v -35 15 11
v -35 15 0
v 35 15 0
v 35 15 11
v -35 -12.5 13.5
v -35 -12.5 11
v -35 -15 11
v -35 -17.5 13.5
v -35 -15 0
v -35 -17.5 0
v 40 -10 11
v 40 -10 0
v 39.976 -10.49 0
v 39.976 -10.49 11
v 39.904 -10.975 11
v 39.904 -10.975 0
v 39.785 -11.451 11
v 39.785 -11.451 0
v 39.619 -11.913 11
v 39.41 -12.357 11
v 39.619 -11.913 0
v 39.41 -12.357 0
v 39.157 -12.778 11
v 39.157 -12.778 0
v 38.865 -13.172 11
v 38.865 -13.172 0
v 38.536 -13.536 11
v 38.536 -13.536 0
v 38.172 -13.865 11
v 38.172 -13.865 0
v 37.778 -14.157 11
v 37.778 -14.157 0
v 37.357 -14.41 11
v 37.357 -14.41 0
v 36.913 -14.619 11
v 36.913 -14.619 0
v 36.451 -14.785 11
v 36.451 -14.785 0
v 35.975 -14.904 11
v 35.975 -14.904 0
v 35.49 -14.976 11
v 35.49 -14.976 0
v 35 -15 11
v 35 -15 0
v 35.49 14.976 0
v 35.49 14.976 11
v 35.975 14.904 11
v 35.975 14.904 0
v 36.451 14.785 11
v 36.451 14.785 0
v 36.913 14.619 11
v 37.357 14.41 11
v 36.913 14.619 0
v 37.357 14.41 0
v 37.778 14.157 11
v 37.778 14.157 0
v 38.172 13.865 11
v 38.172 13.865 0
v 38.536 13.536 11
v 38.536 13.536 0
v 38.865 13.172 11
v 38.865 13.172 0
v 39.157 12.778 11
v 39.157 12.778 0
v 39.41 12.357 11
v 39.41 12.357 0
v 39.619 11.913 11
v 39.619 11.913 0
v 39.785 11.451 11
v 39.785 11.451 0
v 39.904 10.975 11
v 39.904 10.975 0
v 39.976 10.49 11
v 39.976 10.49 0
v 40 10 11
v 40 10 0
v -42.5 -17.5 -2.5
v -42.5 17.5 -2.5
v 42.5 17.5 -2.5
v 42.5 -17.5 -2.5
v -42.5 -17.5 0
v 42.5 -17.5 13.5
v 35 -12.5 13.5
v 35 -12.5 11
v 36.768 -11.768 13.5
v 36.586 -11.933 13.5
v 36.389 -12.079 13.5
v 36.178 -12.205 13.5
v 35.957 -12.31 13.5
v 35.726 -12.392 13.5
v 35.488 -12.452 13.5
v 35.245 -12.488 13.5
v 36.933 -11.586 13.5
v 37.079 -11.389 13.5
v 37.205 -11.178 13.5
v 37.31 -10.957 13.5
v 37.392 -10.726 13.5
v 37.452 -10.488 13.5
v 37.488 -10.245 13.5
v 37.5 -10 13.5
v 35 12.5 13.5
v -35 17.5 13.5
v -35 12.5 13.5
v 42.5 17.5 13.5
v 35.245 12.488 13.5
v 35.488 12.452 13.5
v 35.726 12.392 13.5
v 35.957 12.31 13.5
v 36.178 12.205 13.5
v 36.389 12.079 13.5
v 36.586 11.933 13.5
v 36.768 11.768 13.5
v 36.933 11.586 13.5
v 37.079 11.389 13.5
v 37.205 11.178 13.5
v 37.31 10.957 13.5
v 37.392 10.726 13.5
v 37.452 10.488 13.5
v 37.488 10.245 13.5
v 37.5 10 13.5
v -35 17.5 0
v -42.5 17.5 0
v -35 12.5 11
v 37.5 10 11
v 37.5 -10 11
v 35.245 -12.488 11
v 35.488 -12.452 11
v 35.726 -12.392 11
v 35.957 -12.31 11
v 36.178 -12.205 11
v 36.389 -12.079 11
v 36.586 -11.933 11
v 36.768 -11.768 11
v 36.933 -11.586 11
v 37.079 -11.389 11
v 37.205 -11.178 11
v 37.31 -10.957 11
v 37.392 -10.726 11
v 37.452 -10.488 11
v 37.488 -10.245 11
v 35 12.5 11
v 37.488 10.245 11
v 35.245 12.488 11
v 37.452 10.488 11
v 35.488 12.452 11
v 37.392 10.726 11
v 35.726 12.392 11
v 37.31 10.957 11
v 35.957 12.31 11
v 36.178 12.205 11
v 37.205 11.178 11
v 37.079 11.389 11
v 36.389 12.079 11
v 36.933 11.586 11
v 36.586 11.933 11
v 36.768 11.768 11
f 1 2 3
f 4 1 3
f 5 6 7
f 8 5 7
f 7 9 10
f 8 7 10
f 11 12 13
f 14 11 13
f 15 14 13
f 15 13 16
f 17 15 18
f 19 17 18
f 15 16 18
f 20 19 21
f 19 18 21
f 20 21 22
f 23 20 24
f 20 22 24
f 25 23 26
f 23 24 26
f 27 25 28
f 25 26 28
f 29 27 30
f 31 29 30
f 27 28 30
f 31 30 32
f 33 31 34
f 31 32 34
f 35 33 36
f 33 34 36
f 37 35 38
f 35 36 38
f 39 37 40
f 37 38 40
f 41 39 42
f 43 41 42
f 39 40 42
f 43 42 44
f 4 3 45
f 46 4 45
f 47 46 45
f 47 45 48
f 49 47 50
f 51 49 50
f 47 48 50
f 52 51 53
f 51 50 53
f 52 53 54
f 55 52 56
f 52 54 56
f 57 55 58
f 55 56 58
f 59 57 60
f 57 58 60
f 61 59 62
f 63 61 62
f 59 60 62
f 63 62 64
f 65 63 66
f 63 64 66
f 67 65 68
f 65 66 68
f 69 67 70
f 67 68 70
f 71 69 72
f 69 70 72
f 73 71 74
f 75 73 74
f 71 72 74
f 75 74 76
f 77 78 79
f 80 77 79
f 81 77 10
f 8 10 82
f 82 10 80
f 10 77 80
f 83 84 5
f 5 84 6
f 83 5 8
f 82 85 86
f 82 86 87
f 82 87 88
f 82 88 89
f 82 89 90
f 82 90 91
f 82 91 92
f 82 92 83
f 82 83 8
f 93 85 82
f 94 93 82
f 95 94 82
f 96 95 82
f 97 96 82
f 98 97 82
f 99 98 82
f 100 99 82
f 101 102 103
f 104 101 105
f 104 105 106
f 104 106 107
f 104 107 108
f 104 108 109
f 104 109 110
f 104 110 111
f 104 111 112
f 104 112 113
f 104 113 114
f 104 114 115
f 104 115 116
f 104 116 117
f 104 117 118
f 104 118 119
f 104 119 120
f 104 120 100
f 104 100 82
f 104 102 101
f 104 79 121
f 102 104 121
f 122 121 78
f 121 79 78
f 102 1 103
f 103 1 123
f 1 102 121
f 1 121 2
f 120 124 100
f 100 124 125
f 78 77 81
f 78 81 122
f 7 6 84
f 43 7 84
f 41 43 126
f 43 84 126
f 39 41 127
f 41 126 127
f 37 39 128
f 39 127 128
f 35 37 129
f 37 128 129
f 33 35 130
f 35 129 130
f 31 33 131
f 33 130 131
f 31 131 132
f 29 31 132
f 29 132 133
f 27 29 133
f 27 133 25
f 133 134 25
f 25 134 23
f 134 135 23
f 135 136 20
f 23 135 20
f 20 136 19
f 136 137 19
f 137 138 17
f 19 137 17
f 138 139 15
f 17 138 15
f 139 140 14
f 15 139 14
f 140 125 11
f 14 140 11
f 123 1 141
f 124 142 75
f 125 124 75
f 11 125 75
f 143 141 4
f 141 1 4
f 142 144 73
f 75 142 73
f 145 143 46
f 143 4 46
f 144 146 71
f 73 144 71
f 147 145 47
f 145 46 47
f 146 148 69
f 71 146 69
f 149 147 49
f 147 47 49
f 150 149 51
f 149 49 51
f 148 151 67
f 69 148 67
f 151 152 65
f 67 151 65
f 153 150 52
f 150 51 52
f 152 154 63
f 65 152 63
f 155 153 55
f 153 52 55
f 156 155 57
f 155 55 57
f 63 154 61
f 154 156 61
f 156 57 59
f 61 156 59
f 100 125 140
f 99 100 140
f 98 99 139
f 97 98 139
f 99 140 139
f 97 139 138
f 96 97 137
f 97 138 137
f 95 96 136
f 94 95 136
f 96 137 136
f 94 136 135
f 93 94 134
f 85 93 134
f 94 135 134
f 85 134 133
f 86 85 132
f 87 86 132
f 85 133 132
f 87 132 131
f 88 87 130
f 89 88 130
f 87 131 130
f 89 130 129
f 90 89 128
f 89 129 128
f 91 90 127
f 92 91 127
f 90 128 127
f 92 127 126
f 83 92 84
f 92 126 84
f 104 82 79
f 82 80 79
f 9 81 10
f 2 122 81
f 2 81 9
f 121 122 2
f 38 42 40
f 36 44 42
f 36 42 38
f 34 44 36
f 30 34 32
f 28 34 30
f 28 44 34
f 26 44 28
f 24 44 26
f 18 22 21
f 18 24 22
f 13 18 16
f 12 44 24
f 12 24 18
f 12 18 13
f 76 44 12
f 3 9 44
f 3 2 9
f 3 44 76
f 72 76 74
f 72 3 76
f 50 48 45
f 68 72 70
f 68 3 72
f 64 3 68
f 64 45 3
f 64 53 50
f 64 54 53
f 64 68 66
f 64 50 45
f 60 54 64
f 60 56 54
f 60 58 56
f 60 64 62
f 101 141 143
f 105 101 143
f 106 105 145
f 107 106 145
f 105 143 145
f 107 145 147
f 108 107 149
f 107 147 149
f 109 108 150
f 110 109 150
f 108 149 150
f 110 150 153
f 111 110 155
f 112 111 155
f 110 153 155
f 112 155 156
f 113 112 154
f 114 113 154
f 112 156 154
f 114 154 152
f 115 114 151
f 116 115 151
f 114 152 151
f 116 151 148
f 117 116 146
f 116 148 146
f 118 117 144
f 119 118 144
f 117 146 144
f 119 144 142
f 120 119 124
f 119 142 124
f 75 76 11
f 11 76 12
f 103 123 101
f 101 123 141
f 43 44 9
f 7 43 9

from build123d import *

# Parameters (mm, degrees)
F0_W     = 85
F0_H     = 35
F1_DEPTH = 2.5
F2_DEPTH = 11
F4_DEPTH = 11
F6_DEPTH = 2.5


with BuildPart() as f1:
    # F0 (on Top) → F1 (new body)
    with BuildSketch(Plane.XY):
        Rectangle(F0_W, F0_H)
        with BuildLine():
            ThreePointArc((-40, 10), (-38.5355339059, 13.5355339059), (-35, 15))
            Line((-35, 15), (35, 15))
            ThreePointArc((35, 15), (38.5355339059, 13.5355339059), (40, 10))
            Line((40, 10), (40, -10))
            ThreePointArc((40, -10), (38.5355339059, -13.5355339059), (35, -15))
            Line((35, -15), (-35, -15))
            ThreePointArc((-35, -15), (-38.5355339059, -13.5355339059), (-40, -10))
            Line((-40, -10), (-40, 10))
        make_face(mode=Mode.SUBTRACT)
        with BuildLine():
            Line((35, 15), (-35, 15))
            ThreePointArc((-35, 15), (-38.5355339059, 13.5355339059), (-40, 10))
            Line((-40, 10), (-40, -10))
            ThreePointArc((-40, -10), (-38.5355339059, -13.5355339059), (-35, -15))
            Line((-35, -15), (35, -15))
            ThreePointArc((35, -15), (38.5355339059, -13.5355339059), (40, -10))
            Line((40, -10), (40, 10))
            ThreePointArc((40, 10), (38.5355339059, 13.5355339059), (35, 15))
        make_face()
    extrude(amount=-F1_DEPTH)

    # F0 (on Top) → F2 (join)
    with BuildSketch(Plane.XY):
        Rectangle(F0_W, F0_H)
        with BuildLine():
            ThreePointArc((-40, 10), (-38.5355339059, 13.5355339059), (-35, 15))
            Line((-35, 15), (35, 15))
            ThreePointArc((35, 15), (38.5355339059, 13.5355339059), (40, 10))
            Line((40, 10), (40, -10))
            ThreePointArc((40, -10), (38.5355339059, -13.5355339059), (35, -15))
            Line((35, -15), (-35, -15))
            ThreePointArc((-35, -15), (-38.5355339059, -13.5355339059), (-40, -10))
            Line((-40, -10), (-40, 10))
        make_face(mode=Mode.SUBTRACT)
    extrude(amount=F2_DEPTH)

    # F3 (on face) → F4 (cut, through all)
    with BuildSketch(Plane.XY.offset(11)):
        with BuildLine():
            Line((-35, 15), (-35, 17.5))
            Line((-35, 17.5), (-42.5, 17.5))
            Line((-42.5, 17.5), (-42.5, -17.5))
            Line((-42.5, -17.5), (-35, -17.5))
            Line((-35, -17.5), (-35, -15))
            ThreePointArc((-35, -15), (-38.5355339059, -13.5355339059), (-40, -10))
            Line((-40, -10), (-40, 10))
            ThreePointArc((-40, 10), (-38.5355339059, 13.5355339059), (-35, 15))
        make_face()
    extrude(amount=-F4_DEPTH, mode=Mode.SUBTRACT)

    # F5 (on face) → F6 (join)
    with BuildSketch(Plane.XY.offset(11)):
        with BuildLine():
            Line((-35, 12.4999995357), (35, 12.4999995357))
            ThreePointArc((35, 12.4999995357), (36.7677666247, 11.7677666247), (37.4999995357, 10))
            Line((37.4999995357, 10), (37.4999995357, -10))
            ThreePointArc((37.4999995357, -10), (36.7677666247, -11.7677666247), (35, -12.4999995357))
            Line((35, -12.4999995357), (-35, -12.4999995357))
            Line((-35, -12.4999995357), (-35, -15))
            Line((-35, -15), (35, -15))
            ThreePointArc((35, -15), (38.5355339059, -13.5355339059), (40, -10))
            Line((40, -10), (40, 10))
            ThreePointArc((40, 10), (38.5355339059, 13.5355339059), (35, 15))
            Line((35, 15), (-35, 15))
            Line((-35, 15), (-35, 12.4999995357))
        make_face()
        with BuildLine():
            Line((-35, 17.5), (-35, 15))
            Line((-35, 15), (35, 15))
            ThreePointArc((35, 15), (38.5355339059, 13.5355339059), (40, 10))
            Line((40, 10), (40, -10))
            ThreePointArc((40, -10), (38.5355339059, -13.5355339059), (35, -15))
            Line((35, -15), (-35, -15))
            Line((-35, -15), (-35, -17.5))
            Line((-35, -17.5), (42.5, -17.5))
            Line((42.5, -17.5), (42.5, 17.5))
            Line((42.5, 17.5), (-35, 17.5))
        make_face()
    extrude(amount=F6_DEPTH)


solid = f1.part
